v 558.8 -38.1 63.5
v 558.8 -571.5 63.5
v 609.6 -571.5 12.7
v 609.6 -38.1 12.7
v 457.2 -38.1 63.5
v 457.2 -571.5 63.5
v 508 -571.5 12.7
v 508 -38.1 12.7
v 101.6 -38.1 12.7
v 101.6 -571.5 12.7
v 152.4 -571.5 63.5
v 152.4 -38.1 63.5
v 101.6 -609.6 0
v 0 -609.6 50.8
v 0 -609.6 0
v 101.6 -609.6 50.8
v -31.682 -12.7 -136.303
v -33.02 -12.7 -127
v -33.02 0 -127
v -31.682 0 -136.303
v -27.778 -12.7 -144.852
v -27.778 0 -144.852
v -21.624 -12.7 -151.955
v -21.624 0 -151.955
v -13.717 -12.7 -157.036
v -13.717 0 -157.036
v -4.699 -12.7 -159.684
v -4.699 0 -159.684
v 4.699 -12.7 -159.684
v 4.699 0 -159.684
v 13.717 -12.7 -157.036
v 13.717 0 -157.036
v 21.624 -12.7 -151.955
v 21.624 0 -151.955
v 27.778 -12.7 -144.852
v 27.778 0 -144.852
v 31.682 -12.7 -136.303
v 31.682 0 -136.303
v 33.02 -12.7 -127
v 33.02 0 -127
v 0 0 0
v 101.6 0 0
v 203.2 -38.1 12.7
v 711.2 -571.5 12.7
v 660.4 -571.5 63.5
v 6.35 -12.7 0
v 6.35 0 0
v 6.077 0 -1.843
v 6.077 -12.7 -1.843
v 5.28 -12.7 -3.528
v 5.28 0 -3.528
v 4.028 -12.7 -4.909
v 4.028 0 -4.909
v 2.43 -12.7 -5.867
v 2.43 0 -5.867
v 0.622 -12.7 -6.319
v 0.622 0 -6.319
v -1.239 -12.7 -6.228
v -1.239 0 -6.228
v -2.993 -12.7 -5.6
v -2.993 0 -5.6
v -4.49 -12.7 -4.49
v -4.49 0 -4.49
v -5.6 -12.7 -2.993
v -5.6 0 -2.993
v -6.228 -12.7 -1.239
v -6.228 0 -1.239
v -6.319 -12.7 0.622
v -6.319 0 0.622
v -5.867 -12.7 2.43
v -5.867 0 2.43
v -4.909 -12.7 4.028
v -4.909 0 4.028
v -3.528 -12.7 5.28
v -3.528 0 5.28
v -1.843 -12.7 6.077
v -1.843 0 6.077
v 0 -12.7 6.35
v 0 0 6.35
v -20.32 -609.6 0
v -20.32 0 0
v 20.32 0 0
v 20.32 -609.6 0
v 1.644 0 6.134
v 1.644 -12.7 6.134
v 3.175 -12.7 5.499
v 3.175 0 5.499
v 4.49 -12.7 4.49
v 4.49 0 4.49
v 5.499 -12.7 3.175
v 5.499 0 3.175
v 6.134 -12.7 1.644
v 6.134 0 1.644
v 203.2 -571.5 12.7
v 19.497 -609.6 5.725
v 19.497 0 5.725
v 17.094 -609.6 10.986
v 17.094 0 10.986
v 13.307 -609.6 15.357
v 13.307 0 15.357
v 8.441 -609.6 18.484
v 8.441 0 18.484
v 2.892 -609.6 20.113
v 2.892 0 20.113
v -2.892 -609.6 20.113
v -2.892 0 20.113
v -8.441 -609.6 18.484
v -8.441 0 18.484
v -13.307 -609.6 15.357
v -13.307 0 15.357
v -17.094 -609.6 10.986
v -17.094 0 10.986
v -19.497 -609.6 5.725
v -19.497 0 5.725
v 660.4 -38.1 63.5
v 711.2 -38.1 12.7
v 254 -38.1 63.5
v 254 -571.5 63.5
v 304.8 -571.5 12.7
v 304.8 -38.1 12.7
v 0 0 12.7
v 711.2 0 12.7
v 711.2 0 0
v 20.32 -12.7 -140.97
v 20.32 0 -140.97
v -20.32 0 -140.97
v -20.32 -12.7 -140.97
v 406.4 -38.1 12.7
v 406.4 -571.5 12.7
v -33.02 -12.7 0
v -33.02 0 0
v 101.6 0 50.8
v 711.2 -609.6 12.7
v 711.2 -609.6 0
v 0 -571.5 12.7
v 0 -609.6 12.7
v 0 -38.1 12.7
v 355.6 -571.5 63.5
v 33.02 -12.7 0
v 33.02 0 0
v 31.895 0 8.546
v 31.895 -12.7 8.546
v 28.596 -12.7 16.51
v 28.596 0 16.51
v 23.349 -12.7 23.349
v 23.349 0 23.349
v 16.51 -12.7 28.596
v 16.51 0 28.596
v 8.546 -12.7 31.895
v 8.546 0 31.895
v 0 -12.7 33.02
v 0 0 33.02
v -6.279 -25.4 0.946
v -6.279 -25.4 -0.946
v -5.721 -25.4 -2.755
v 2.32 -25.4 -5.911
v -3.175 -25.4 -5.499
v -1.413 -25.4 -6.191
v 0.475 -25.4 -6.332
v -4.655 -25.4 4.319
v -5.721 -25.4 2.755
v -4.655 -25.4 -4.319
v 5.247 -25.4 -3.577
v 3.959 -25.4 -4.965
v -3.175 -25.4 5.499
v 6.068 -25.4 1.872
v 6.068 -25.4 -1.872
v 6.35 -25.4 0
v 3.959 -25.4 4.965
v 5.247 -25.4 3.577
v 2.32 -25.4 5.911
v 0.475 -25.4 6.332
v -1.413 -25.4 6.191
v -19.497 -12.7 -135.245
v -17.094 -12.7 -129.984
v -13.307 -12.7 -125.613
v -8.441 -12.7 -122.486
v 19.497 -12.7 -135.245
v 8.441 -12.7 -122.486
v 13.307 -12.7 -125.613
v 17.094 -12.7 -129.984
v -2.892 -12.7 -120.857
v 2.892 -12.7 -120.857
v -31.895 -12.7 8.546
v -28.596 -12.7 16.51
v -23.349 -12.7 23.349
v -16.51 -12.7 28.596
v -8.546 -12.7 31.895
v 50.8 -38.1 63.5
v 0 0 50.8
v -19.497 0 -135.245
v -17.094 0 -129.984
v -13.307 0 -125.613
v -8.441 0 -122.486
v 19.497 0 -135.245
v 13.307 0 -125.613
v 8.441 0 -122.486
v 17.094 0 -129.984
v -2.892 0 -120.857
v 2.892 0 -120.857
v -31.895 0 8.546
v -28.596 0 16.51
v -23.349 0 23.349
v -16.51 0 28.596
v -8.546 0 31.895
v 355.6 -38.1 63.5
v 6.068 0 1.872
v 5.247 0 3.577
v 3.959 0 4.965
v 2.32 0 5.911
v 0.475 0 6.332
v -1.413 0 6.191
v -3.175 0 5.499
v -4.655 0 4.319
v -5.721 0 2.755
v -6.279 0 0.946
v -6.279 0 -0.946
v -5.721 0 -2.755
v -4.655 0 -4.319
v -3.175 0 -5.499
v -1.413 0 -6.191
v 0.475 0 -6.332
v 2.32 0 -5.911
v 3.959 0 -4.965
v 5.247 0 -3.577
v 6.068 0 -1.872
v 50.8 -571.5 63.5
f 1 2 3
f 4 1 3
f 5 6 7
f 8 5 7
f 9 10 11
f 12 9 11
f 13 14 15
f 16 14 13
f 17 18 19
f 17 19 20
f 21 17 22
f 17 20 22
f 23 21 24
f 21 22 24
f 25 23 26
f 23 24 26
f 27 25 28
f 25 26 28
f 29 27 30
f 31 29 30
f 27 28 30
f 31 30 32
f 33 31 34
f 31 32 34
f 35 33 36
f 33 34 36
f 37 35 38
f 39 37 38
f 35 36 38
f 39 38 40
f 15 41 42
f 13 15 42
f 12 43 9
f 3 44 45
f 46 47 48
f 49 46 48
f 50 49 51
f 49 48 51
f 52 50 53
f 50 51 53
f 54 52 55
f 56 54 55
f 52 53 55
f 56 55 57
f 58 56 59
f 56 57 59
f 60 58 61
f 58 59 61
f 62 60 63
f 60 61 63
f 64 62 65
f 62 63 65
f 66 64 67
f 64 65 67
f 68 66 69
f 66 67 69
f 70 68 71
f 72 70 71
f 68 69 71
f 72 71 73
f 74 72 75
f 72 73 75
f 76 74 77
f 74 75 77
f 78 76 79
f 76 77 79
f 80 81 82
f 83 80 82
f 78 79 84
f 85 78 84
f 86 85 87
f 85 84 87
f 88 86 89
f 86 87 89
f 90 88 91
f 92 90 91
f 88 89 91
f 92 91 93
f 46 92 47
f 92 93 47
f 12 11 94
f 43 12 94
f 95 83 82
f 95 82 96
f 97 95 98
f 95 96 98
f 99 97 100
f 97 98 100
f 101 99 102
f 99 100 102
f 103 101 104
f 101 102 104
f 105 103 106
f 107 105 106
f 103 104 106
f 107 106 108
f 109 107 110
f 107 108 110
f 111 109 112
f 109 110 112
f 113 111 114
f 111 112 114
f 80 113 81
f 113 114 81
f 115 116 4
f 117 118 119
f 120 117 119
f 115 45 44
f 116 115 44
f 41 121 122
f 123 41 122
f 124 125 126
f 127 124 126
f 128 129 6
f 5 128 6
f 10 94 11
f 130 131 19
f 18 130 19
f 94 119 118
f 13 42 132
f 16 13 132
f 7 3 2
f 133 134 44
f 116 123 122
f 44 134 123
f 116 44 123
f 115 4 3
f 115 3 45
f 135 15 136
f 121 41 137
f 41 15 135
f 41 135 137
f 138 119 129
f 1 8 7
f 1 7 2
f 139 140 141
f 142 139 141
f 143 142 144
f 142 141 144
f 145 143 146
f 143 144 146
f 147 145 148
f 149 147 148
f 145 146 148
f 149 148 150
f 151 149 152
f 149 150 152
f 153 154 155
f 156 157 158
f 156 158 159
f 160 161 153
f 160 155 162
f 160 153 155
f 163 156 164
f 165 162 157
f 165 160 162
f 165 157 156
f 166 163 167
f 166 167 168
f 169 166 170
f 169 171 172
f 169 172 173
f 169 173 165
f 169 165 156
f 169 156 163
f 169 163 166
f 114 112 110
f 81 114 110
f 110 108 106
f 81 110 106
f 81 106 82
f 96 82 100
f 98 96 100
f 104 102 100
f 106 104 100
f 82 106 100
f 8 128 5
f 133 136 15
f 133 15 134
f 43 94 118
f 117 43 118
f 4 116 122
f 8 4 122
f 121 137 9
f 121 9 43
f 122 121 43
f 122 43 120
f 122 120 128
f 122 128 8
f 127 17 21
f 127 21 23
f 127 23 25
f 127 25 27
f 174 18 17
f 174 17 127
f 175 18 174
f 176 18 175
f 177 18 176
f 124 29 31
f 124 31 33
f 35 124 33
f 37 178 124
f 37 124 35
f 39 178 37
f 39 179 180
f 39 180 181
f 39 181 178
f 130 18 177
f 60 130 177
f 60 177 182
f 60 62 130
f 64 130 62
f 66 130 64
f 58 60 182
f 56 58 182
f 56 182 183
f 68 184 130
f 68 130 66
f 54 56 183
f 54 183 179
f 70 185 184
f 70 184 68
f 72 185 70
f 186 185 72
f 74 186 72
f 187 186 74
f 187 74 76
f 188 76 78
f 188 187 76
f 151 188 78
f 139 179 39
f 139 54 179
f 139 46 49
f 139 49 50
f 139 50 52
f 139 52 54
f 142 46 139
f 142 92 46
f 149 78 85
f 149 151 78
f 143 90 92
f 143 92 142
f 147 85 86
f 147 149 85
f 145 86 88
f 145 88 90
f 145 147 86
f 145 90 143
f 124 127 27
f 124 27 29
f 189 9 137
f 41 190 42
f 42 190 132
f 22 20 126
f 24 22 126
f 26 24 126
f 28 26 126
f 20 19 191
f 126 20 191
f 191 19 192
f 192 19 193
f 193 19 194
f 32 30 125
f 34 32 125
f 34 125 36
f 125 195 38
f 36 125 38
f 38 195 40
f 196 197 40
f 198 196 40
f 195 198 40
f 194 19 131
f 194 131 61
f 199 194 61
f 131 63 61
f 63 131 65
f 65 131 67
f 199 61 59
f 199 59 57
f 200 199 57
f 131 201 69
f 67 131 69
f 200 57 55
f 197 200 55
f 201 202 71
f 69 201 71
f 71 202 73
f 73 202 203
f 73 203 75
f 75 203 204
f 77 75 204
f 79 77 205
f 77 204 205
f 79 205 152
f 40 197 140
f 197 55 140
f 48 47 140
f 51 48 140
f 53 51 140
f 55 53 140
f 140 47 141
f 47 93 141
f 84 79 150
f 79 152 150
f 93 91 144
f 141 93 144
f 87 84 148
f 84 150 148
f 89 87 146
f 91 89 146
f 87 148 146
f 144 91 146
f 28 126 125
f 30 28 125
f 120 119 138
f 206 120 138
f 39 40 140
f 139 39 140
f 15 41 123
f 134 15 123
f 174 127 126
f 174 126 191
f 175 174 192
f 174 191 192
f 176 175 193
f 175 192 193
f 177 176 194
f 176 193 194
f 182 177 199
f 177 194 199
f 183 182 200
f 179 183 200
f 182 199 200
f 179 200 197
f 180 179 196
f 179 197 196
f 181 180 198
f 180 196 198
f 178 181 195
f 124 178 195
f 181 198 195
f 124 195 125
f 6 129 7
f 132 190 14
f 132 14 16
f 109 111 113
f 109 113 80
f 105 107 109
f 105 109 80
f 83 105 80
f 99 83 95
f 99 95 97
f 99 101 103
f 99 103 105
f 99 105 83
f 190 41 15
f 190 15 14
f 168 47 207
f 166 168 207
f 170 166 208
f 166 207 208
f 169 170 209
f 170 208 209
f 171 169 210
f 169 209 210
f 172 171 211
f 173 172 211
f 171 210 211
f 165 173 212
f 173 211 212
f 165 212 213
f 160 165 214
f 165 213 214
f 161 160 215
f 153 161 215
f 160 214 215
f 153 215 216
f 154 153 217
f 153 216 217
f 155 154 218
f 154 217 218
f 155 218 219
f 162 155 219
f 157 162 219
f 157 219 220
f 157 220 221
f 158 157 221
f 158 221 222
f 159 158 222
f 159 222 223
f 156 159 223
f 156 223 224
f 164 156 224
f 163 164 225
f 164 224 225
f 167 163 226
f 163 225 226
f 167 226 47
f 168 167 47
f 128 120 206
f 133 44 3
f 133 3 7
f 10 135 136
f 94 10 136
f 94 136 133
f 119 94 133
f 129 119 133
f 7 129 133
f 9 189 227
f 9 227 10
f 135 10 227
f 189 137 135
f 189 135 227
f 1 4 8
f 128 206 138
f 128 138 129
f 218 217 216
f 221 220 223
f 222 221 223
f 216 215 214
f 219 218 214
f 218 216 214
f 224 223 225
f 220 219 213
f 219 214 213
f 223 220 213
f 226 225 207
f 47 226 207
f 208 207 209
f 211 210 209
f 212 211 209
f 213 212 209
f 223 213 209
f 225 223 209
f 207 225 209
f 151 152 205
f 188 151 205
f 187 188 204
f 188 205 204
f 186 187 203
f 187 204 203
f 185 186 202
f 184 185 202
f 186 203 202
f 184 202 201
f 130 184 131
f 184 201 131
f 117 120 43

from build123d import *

# Parameters (mm, degrees)
F0_W      = 101.6
F0_H      = 50.8
F1_DEPTH  = 609.6
F2_W      = 711.2
F2_H      = 63.5
F3_DEPTH  = 609.6
F5_DEPTH  = 609.601
F6_W      = 38.1
F6_H      = 63.5
F7_DEPTH  = 711.201
F8_W      = 38.1
F8_H      = 76.2
F9_DEPTH  = 711.201
F10_R     = 6.35
F11_DEPTH = 25.4
F13_DEPTH = 609.6
F15_DEPTH = 12.7


with BuildPart() as f1:
    # F0 (on Front) → F1 (new body)
    with BuildSketch(Plane.XZ):
        with Locations((50.8, 25.4)):
            Rectangle(F0_W, F0_H)
    extrude(amount=F1_DEPTH)


with BuildPart() as f3:
    # F2 (on Front) → F3 (new body)
    with BuildSketch(Plane.XZ):
        with Locations((355.6, 31.75)):
            Rectangle(F2_W, F2_H)
    extrude(amount=F3_DEPTH)

    # F4 (on face) → F5 (cut, through all)
    with BuildSketch(Plane.XZ.offset(609.6)):
        Polygon((0, 63.5), (0, 12.7), (50.8, 63.5), align=None)
        Polygon((152.4, 63.5), (50.8, 63.5), (101.6, 12.7), align=None)
        Polygon((254, 63.5), (152.4, 63.5), (203.2, 12.7), align=None)
        Polygon((355.6, 63.5), (254, 63.5), (304.8, 12.7), align=None)
        Polygon((457.2, 63.5), (355.6, 63.5), (406.4, 12.7), align=None)
        Polygon((508, 12.7), (558.8, 63.5), (457.2, 63.5), align=None)
        Polygon((609.6, 12.7), (660.4, 63.5), (558.8, 63.5), align=None)
        Polygon((660.4, 63.5), (711.2, 12.7), (711.2, 63.5), align=None)
    extrude(amount=-F5_DEPTH, mode=Mode.SUBTRACT)

    # F6 (on Right) → F7 (cut, through all)
    with BuildSketch(Plane.YZ):
        with Locations((-19.05, 44.45)):
            Rectangle(F6_W, F6_H)
    extrude(amount=F7_DEPTH, mode=Mode.SUBTRACT)

    # F8 (on face) → F9 (cut, through all)
    with BuildSketch(Plane(origin=(0, 0, 0), x_dir=(0, -1, 0), z_dir=(-1, 0, 0))):
        with Locations((590.55, 50.8)):
            Rectangle(F8_W, F8_H)
    extrude(amount=-F9_DEPTH, mode=Mode.SUBTRACT)


with BuildPart() as f11:
    # F10 (on Front) → F11 (new body)
    with BuildSketch(Plane.XZ):
        Circle(F10_R)
    extrude(amount=F11_DEPTH)


with BuildPart() as f13:
    # F12 (on Front) → F13 (new body)
    with BuildSketch(Plane.XZ):
        with BuildLine():
            Line((-20.32, 0), (20.32, 0))
            ThreePointArc((20.32, 0), (0, 20.32), (-20.32, 0))
        make_face()
    extrude(amount=F13_DEPTH)


with BuildPart() as f15:
    # F14 (on Front) → F15 (new body)
    with BuildSketch(Plane.XZ):
        with BuildLine():
            Line((33.02, -127), (33.02, 0))
            ThreePointArc((33.02, 0), (23.3486659148, 23.3486659148), (0, 33.02))
            ThreePointArc((0, 33.02), (-23.3486659148, 23.3486659148), (-33.02, 0))
            Line((-33.02, 0), (-33.02, -127))
            ThreePointArc((-33.02, -127), (0, -160.02), (33.02, -127))
        make_face()
        with BuildLine():
            Line((20.32, -140.97), (0, -140.97))
            Line((0, -140.97), (-20.32, -140.97))
            ThreePointArc((-20.32, -140.97), (0, -120.65), (20.32, -140.97))
        make_face(mode=Mode.SUBTRACT)
        with BuildLine():
            ThreePointArc((6.35, 0), (-4.4901280605, -4.4901280605), (0, 6.35))
            ThreePointArc((0, 6.35), (4.4901280605, 4.4901280605), (6.35, 0))
        make_face(mode=Mode.SUBTRACT)
    extrude(amount=F15_DEPTH)


solid = Compound([f1.part, f3.part, f11.part, f13.part, f15.part])
